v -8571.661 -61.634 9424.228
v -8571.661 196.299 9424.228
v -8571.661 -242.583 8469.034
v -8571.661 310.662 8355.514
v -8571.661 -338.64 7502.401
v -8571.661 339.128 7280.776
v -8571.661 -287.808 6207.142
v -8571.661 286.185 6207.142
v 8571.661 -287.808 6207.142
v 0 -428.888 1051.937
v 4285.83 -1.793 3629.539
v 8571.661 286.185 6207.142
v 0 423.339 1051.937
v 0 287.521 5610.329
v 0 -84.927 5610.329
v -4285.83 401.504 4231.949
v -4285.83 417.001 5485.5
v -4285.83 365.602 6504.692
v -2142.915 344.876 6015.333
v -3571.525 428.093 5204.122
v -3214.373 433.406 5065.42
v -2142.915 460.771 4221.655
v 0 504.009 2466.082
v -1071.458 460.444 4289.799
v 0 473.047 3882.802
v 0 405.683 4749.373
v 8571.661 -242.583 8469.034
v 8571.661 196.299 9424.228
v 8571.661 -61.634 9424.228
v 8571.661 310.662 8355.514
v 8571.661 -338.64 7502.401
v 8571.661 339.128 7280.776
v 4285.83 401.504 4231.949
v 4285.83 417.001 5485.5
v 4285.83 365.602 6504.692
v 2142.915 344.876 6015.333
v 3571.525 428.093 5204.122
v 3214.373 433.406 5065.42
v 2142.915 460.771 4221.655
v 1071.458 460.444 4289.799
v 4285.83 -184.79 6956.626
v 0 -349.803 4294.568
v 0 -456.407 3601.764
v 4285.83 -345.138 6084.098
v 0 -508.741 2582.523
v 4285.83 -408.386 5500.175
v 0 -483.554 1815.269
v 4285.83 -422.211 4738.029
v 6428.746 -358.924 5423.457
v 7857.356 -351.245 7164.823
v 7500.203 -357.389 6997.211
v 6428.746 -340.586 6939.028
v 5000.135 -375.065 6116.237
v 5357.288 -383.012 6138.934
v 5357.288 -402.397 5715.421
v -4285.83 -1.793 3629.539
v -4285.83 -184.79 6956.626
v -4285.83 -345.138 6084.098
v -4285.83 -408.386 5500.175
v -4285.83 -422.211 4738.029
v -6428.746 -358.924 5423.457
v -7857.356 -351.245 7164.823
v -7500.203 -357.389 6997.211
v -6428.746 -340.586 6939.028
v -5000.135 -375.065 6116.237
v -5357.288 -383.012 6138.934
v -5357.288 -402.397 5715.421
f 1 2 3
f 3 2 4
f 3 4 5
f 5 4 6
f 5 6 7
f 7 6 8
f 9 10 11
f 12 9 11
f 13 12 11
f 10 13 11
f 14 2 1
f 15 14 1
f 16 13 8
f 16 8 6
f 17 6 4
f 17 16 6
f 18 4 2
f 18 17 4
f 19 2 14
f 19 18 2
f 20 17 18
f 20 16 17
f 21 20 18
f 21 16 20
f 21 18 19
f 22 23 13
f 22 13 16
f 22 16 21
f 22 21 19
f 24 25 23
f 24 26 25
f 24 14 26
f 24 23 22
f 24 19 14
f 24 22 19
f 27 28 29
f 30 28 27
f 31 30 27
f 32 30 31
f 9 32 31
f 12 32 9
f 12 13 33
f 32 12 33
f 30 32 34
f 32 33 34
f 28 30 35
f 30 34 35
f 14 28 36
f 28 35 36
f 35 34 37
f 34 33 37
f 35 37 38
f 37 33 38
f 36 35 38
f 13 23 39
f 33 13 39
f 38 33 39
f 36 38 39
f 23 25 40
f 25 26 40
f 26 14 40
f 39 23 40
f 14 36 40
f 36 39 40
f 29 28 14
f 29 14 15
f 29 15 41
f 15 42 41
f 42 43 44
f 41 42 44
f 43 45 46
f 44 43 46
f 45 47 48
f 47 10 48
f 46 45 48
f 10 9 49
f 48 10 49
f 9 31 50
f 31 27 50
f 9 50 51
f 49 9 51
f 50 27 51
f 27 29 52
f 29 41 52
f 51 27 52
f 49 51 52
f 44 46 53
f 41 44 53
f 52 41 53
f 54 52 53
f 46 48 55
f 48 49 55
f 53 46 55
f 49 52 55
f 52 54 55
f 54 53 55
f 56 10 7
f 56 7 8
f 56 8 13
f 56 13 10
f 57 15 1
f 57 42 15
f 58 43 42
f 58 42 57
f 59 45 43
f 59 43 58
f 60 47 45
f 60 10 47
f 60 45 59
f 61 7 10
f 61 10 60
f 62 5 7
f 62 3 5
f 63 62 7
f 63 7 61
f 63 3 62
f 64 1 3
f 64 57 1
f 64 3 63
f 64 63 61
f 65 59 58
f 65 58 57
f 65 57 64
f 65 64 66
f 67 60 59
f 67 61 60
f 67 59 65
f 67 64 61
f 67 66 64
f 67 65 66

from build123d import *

# Parameters (mm, degrees)
SKETCH4_W          = 14453.89622635
SKETCH4_H          = 1933.47388346
CUT_EXTRUDE1_DEPTH = 10363.2


with BuildPart() as part:
    # Surface-Knit3: read off the stored shape, not the designer's step
    # Surface-Knit3: loft between two sections, ruled curve by curve
    surface_knit3_from = [
        Edge.make_bspline([(-18934.86083303, -33.471877701, 14035.260302209), (-18934.86083303, -39.232985839, 14002.414162771), (-18934.86083303, -47.715782252, 13953.087416618), (-18934.86083303, -58.593854823, 13887.209164739), (-18934.86083303, -66.507610448, 13837.747264713), (-18934.86083303, -74.147929788, 13788.233570957), (-18934.86083303, -81.486158392, 13738.669560406), (-18934.86083303, -88.493641805, 13689.05671), (-18934.86083303, -95.141754057, 13639.396403204), (-18934.86083303, -101.401869176, 13589.690023484), (-18934.86083303, -107.245307184, 13539.93909477), (-18934.86083303, -112.643388102, 13490.145140997), (-18934.86083303, -117.567678303, 13440.309392829), (-18934.86083303, -121.989029798, 13390.433447384), (-18934.86083303, -125.879828529, 13340.518702968), (-18934.86083303, -129.209310817, 13290.566519876), (-18934.86083303, -131.954702468, 13240.578682825), (-18934.86083303, -134.14520626, 13190.560174508), (-18934.86083303, -135.804072585, 13140.515669307), (-18934.86083303, -136.957154136, 13090.449860186), (-18934.86083303, -137.629044966, 13040.367632538), (-18934.86083303, -137.844894397, 12990.273526261), (-18934.86083303, -137.629680637, 12940.172355997), (-18934.86083303, -137.008381893, 12890.068936387), (-18934.86083303, -136.006003569, 12839.967950624), (-18934.86083303, -134.647551066, 12789.874081899), (-18934.86083303, -132.95801886, 12739.792102688), (-18934.86083303, -130.962401424, 12689.726785468), (-18934.86083303, -127.926797655, 12623.001530101), (-18934.86083303, -123.492079064, 12539.660184396), (-18934.86083303, -119.394727721, 12473.082010903), (-18934.86083303, -117.241989306, 12439.822954241)], [0, 0, 0, 0, 0.0625, 0.09375, 0.125, 0.15625, 0.1875, 0.21875, 0.25, 0.28125, 0.3125, 0.34375, 0.375, 0.40625, 0.4375, 0.46875, 0.5, 0.53125, 0.5625, 0.59375, 0.625, 0.65625, 0.6875, 0.71875, 0.75, 0.78125, 0.8125, 0.84375, 0.875, 0.9375, 1, 1, 1, 1], 3),
        Edge.make_bspline([(-18934.86083303, 120.365325484, 12439.822954241), (-18934.86083303, 122.494054894, 12473.055401614), (-18934.86083303, 126.348166334, 12539.535389158), (-18934.86083303, 130.970433248, 12639.294765427), (-18934.86083303, 134.484961546, 12739.087731356), (-18934.86083303, 136.942878492, 12838.90834322), (-18934.86083303, 138.15329091, 12922.110479008), (-18934.86083303, 138.644447388, 12988.680095077), (-18934.86083303, 138.780640496, 13038.61059056), (-18934.86083303, 138.691071829, 13088.543699188), (-18934.86083303, 138.382083573, 13138.478582735), (-18934.86083303, 137.860017912, 13188.414402975), (-18934.86083303, 137.131671681, 13238.350752055), (-18934.86083303, 136.20230149, 13288.286529831), (-18934.86083303, 135.081246142, 13338.221455349), (-18934.86083303, 133.748889114, 13388.152259432), (-18934.86083303, 132.179607267, 13438.075464594), (-18934.86083303, 130.34973447, 13487.987392083), (-18934.86083303, 128.235032848, 13537.884567717), (-18934.86083303, 125.811264523, 13587.763517313), (-18934.86083303, 122.135284813, 13654.239733934), (-18934.86083303, 116.646894642, 13737.271634153), (-18934.86083303, 108.437897072, 13836.780359182), (-18934.86083303, 98.412625908, 13936.131237745), (-18934.86083303, 90.38932828, 14002.241097744), (-18934.86083303, 86.010505038, 14035.260302209)], [0, 0, 0, 0, 0.0625, 0.125, 0.1875, 0.25, 0.3125, 0.34375, 0.375, 0.40625, 0.4375, 0.46875, 0.5, 0.53125, 0.5625, 0.59375, 0.625, 0.65625, 0.6875, 0.71875, 0.75, 0.8125, 0.875, 0.9375, 1, 1, 1, 1], 3),
        Edge.make_line((-18934.86083303, -117.241989306, 12439.822954241), (-18934.86083303, 120.365325484, 12439.822954241)),
        Edge.make_line((-18934.86083303, 86.010505038, 14035.260302209), (-18934.86083303, -33.471877701, 14035.260302209)),
    ]
    surface_knit3_to = [
        Edge.make_bspline([(0, -84.927317993, 5610.329135713), (0, -102.667137494, 5516.48325358), (0, -130.501822373, 5375.762521563), (0, -168.972896676, 5188.136309302), (0, -198.232407134, 5047.393433635), (0, -227.625131997, 4906.603749811), (0, -256.878244625, 4765.74341763), (0, -285.718671343, 4624.788710261), (0, -313.873736057, 4483.715887809), (0, -341.07008869, 4342.501145232), (0, -367.035568499, 4201.120833355), (0, -391.495939954, 4059.551011763), (0, -414.1804739, 3917.768241677), (0, -434.812449325, 3775.748222394), (0, -453.125940488, 3633.46820848), (0, -468.834062649, 3490.902433673), (0, -481.70175033, 3348.032601241), (0, -491.910608802, 3204.9004744), (0, -499.601564269, 3061.54195392), (0, -504.933479647, 2917.995523713), (0, -508.056032589, 2774.298348093), (0, -509.12376877, 2630.488284808), (0, -508.288630683, 2486.60283187), (0, -505.703960256, 2342.679659676), (0, -501.522338107, 2198.756386936), (0, -495.896769336, 2054.870573581), (0, -488.980021681, 1911.059989844), (0, -480.924976797, 1767.361947417), (0, -468.871008063, 1575.96551596), (0, -451.722002387, 1337.189173494), (0, -436.597775788, 1146.870498433), (0, -428.888194187, 1051.936712946)], [0, 0, 0, 0, 0.0625, 0.09375, 0.125, 0.15625, 0.1875, 0.21875, 0.25, 0.28125, 0.3125, 0.34375, 0.375, 0.40625, 0.4375, 0.46875, 0.5, 0.53125, 0.5625, 0.59375, 0.625, 0.65625, 0.6875, 0.71875, 0.75, 0.78125, 0.8125, 0.84375, 0.875, 0.9375, 1, 1, 1, 1], 3),
        Edge.make_bspline([(0, 423.339106489, 1051.936712946), (0, 433.430870807, 1146.759677835), (0, 451.544338374, 1336.536812968), (0, 472.84367101, 1621.537950643), (0, 488.611484269, 1906.81662352), (0, 499.187071227, 2192.314460642), (0, 503.956030141, 2430.36398482), (0, 505.514370769, 2620.854949524), (0, 505.597253239, 2763.741874097), (0, 504.636359826, 2906.63997626), (0, 502.674763974, 3049.542181379), (0, 499.753613675, 3192.441068828), (0, 495.917742322, 3335.329582719), (0, 491.204804542, 3478.200122358), (0, 485.668215769, 3621.046179455), (0, 479.262806583, 3763.854585812), (0, 471.919211522, 3906.610536852), (0, 463.577416428, 4049.299879622), (0, 454.172707472, 4191.908098118), (0, 443.642802113, 4334.420929134), (0, 428.018010365, 4524.291516807), (0, 405.357871452, 4761.319395858), (0, 372.654103084, 5045.140911431), (0, 333.933906588, 5328.235696321), (0, 303.772919031, 5516.404301316), (0, 287.521402652, 5610.329135713)], [0, 0, 0, 0, 0.0625, 0.125, 0.1875, 0.25, 0.3125, 0.34375, 0.375, 0.40625, 0.4375, 0.46875, 0.5, 0.53125, 0.5625, 0.59375, 0.625, 0.65625, 0.6875, 0.71875, 0.75, 0.8125, 0.875, 0.9375, 1, 1, 1, 1], 3),
        Edge.make_line((0, -428.888194187, 1051.936712946), (0, 423.339106489, 1051.936712946)),
        Edge.make_line((0, 287.521402652, 5610.329135713), (0, -84.927317993, 5610.329135713)),
    ]
    surface_knit3 = Solid(Shell([*[Face.make_surface_from_curves(surface_knit3_from[k], surface_knit3_to[k]) for k in range(4)], Face(Wire(surface_knit3_from)), Face(Wire(surface_knit3_to))]))
    add(surface_knit3)

    # Sketch4 → Cut-Extrude1 (cut)
    with BuildSketch(Plane(origin=(-18934.86083303, 0, 0), x_dir=(0, 0, -1), z_dir=(1, 0, 0))):
        with Locations((-7774.786517892, 36.739287504)):
            Rectangle(SKETCH4_W, SKETCH4_H)
    extrude(amount=CUT_EXTRUDE1_DEPTH, mode=Mode.SUBTRACT)

    # Mirror1: part across plane


with BuildPart() as part_1:
    add(part.part)
    add(part.part.mirror(Plane(origin=(0, 0, 0), x_dir=(0, 0, 1), z_dir=(1, 0, 0))))


solid = part_1.part
